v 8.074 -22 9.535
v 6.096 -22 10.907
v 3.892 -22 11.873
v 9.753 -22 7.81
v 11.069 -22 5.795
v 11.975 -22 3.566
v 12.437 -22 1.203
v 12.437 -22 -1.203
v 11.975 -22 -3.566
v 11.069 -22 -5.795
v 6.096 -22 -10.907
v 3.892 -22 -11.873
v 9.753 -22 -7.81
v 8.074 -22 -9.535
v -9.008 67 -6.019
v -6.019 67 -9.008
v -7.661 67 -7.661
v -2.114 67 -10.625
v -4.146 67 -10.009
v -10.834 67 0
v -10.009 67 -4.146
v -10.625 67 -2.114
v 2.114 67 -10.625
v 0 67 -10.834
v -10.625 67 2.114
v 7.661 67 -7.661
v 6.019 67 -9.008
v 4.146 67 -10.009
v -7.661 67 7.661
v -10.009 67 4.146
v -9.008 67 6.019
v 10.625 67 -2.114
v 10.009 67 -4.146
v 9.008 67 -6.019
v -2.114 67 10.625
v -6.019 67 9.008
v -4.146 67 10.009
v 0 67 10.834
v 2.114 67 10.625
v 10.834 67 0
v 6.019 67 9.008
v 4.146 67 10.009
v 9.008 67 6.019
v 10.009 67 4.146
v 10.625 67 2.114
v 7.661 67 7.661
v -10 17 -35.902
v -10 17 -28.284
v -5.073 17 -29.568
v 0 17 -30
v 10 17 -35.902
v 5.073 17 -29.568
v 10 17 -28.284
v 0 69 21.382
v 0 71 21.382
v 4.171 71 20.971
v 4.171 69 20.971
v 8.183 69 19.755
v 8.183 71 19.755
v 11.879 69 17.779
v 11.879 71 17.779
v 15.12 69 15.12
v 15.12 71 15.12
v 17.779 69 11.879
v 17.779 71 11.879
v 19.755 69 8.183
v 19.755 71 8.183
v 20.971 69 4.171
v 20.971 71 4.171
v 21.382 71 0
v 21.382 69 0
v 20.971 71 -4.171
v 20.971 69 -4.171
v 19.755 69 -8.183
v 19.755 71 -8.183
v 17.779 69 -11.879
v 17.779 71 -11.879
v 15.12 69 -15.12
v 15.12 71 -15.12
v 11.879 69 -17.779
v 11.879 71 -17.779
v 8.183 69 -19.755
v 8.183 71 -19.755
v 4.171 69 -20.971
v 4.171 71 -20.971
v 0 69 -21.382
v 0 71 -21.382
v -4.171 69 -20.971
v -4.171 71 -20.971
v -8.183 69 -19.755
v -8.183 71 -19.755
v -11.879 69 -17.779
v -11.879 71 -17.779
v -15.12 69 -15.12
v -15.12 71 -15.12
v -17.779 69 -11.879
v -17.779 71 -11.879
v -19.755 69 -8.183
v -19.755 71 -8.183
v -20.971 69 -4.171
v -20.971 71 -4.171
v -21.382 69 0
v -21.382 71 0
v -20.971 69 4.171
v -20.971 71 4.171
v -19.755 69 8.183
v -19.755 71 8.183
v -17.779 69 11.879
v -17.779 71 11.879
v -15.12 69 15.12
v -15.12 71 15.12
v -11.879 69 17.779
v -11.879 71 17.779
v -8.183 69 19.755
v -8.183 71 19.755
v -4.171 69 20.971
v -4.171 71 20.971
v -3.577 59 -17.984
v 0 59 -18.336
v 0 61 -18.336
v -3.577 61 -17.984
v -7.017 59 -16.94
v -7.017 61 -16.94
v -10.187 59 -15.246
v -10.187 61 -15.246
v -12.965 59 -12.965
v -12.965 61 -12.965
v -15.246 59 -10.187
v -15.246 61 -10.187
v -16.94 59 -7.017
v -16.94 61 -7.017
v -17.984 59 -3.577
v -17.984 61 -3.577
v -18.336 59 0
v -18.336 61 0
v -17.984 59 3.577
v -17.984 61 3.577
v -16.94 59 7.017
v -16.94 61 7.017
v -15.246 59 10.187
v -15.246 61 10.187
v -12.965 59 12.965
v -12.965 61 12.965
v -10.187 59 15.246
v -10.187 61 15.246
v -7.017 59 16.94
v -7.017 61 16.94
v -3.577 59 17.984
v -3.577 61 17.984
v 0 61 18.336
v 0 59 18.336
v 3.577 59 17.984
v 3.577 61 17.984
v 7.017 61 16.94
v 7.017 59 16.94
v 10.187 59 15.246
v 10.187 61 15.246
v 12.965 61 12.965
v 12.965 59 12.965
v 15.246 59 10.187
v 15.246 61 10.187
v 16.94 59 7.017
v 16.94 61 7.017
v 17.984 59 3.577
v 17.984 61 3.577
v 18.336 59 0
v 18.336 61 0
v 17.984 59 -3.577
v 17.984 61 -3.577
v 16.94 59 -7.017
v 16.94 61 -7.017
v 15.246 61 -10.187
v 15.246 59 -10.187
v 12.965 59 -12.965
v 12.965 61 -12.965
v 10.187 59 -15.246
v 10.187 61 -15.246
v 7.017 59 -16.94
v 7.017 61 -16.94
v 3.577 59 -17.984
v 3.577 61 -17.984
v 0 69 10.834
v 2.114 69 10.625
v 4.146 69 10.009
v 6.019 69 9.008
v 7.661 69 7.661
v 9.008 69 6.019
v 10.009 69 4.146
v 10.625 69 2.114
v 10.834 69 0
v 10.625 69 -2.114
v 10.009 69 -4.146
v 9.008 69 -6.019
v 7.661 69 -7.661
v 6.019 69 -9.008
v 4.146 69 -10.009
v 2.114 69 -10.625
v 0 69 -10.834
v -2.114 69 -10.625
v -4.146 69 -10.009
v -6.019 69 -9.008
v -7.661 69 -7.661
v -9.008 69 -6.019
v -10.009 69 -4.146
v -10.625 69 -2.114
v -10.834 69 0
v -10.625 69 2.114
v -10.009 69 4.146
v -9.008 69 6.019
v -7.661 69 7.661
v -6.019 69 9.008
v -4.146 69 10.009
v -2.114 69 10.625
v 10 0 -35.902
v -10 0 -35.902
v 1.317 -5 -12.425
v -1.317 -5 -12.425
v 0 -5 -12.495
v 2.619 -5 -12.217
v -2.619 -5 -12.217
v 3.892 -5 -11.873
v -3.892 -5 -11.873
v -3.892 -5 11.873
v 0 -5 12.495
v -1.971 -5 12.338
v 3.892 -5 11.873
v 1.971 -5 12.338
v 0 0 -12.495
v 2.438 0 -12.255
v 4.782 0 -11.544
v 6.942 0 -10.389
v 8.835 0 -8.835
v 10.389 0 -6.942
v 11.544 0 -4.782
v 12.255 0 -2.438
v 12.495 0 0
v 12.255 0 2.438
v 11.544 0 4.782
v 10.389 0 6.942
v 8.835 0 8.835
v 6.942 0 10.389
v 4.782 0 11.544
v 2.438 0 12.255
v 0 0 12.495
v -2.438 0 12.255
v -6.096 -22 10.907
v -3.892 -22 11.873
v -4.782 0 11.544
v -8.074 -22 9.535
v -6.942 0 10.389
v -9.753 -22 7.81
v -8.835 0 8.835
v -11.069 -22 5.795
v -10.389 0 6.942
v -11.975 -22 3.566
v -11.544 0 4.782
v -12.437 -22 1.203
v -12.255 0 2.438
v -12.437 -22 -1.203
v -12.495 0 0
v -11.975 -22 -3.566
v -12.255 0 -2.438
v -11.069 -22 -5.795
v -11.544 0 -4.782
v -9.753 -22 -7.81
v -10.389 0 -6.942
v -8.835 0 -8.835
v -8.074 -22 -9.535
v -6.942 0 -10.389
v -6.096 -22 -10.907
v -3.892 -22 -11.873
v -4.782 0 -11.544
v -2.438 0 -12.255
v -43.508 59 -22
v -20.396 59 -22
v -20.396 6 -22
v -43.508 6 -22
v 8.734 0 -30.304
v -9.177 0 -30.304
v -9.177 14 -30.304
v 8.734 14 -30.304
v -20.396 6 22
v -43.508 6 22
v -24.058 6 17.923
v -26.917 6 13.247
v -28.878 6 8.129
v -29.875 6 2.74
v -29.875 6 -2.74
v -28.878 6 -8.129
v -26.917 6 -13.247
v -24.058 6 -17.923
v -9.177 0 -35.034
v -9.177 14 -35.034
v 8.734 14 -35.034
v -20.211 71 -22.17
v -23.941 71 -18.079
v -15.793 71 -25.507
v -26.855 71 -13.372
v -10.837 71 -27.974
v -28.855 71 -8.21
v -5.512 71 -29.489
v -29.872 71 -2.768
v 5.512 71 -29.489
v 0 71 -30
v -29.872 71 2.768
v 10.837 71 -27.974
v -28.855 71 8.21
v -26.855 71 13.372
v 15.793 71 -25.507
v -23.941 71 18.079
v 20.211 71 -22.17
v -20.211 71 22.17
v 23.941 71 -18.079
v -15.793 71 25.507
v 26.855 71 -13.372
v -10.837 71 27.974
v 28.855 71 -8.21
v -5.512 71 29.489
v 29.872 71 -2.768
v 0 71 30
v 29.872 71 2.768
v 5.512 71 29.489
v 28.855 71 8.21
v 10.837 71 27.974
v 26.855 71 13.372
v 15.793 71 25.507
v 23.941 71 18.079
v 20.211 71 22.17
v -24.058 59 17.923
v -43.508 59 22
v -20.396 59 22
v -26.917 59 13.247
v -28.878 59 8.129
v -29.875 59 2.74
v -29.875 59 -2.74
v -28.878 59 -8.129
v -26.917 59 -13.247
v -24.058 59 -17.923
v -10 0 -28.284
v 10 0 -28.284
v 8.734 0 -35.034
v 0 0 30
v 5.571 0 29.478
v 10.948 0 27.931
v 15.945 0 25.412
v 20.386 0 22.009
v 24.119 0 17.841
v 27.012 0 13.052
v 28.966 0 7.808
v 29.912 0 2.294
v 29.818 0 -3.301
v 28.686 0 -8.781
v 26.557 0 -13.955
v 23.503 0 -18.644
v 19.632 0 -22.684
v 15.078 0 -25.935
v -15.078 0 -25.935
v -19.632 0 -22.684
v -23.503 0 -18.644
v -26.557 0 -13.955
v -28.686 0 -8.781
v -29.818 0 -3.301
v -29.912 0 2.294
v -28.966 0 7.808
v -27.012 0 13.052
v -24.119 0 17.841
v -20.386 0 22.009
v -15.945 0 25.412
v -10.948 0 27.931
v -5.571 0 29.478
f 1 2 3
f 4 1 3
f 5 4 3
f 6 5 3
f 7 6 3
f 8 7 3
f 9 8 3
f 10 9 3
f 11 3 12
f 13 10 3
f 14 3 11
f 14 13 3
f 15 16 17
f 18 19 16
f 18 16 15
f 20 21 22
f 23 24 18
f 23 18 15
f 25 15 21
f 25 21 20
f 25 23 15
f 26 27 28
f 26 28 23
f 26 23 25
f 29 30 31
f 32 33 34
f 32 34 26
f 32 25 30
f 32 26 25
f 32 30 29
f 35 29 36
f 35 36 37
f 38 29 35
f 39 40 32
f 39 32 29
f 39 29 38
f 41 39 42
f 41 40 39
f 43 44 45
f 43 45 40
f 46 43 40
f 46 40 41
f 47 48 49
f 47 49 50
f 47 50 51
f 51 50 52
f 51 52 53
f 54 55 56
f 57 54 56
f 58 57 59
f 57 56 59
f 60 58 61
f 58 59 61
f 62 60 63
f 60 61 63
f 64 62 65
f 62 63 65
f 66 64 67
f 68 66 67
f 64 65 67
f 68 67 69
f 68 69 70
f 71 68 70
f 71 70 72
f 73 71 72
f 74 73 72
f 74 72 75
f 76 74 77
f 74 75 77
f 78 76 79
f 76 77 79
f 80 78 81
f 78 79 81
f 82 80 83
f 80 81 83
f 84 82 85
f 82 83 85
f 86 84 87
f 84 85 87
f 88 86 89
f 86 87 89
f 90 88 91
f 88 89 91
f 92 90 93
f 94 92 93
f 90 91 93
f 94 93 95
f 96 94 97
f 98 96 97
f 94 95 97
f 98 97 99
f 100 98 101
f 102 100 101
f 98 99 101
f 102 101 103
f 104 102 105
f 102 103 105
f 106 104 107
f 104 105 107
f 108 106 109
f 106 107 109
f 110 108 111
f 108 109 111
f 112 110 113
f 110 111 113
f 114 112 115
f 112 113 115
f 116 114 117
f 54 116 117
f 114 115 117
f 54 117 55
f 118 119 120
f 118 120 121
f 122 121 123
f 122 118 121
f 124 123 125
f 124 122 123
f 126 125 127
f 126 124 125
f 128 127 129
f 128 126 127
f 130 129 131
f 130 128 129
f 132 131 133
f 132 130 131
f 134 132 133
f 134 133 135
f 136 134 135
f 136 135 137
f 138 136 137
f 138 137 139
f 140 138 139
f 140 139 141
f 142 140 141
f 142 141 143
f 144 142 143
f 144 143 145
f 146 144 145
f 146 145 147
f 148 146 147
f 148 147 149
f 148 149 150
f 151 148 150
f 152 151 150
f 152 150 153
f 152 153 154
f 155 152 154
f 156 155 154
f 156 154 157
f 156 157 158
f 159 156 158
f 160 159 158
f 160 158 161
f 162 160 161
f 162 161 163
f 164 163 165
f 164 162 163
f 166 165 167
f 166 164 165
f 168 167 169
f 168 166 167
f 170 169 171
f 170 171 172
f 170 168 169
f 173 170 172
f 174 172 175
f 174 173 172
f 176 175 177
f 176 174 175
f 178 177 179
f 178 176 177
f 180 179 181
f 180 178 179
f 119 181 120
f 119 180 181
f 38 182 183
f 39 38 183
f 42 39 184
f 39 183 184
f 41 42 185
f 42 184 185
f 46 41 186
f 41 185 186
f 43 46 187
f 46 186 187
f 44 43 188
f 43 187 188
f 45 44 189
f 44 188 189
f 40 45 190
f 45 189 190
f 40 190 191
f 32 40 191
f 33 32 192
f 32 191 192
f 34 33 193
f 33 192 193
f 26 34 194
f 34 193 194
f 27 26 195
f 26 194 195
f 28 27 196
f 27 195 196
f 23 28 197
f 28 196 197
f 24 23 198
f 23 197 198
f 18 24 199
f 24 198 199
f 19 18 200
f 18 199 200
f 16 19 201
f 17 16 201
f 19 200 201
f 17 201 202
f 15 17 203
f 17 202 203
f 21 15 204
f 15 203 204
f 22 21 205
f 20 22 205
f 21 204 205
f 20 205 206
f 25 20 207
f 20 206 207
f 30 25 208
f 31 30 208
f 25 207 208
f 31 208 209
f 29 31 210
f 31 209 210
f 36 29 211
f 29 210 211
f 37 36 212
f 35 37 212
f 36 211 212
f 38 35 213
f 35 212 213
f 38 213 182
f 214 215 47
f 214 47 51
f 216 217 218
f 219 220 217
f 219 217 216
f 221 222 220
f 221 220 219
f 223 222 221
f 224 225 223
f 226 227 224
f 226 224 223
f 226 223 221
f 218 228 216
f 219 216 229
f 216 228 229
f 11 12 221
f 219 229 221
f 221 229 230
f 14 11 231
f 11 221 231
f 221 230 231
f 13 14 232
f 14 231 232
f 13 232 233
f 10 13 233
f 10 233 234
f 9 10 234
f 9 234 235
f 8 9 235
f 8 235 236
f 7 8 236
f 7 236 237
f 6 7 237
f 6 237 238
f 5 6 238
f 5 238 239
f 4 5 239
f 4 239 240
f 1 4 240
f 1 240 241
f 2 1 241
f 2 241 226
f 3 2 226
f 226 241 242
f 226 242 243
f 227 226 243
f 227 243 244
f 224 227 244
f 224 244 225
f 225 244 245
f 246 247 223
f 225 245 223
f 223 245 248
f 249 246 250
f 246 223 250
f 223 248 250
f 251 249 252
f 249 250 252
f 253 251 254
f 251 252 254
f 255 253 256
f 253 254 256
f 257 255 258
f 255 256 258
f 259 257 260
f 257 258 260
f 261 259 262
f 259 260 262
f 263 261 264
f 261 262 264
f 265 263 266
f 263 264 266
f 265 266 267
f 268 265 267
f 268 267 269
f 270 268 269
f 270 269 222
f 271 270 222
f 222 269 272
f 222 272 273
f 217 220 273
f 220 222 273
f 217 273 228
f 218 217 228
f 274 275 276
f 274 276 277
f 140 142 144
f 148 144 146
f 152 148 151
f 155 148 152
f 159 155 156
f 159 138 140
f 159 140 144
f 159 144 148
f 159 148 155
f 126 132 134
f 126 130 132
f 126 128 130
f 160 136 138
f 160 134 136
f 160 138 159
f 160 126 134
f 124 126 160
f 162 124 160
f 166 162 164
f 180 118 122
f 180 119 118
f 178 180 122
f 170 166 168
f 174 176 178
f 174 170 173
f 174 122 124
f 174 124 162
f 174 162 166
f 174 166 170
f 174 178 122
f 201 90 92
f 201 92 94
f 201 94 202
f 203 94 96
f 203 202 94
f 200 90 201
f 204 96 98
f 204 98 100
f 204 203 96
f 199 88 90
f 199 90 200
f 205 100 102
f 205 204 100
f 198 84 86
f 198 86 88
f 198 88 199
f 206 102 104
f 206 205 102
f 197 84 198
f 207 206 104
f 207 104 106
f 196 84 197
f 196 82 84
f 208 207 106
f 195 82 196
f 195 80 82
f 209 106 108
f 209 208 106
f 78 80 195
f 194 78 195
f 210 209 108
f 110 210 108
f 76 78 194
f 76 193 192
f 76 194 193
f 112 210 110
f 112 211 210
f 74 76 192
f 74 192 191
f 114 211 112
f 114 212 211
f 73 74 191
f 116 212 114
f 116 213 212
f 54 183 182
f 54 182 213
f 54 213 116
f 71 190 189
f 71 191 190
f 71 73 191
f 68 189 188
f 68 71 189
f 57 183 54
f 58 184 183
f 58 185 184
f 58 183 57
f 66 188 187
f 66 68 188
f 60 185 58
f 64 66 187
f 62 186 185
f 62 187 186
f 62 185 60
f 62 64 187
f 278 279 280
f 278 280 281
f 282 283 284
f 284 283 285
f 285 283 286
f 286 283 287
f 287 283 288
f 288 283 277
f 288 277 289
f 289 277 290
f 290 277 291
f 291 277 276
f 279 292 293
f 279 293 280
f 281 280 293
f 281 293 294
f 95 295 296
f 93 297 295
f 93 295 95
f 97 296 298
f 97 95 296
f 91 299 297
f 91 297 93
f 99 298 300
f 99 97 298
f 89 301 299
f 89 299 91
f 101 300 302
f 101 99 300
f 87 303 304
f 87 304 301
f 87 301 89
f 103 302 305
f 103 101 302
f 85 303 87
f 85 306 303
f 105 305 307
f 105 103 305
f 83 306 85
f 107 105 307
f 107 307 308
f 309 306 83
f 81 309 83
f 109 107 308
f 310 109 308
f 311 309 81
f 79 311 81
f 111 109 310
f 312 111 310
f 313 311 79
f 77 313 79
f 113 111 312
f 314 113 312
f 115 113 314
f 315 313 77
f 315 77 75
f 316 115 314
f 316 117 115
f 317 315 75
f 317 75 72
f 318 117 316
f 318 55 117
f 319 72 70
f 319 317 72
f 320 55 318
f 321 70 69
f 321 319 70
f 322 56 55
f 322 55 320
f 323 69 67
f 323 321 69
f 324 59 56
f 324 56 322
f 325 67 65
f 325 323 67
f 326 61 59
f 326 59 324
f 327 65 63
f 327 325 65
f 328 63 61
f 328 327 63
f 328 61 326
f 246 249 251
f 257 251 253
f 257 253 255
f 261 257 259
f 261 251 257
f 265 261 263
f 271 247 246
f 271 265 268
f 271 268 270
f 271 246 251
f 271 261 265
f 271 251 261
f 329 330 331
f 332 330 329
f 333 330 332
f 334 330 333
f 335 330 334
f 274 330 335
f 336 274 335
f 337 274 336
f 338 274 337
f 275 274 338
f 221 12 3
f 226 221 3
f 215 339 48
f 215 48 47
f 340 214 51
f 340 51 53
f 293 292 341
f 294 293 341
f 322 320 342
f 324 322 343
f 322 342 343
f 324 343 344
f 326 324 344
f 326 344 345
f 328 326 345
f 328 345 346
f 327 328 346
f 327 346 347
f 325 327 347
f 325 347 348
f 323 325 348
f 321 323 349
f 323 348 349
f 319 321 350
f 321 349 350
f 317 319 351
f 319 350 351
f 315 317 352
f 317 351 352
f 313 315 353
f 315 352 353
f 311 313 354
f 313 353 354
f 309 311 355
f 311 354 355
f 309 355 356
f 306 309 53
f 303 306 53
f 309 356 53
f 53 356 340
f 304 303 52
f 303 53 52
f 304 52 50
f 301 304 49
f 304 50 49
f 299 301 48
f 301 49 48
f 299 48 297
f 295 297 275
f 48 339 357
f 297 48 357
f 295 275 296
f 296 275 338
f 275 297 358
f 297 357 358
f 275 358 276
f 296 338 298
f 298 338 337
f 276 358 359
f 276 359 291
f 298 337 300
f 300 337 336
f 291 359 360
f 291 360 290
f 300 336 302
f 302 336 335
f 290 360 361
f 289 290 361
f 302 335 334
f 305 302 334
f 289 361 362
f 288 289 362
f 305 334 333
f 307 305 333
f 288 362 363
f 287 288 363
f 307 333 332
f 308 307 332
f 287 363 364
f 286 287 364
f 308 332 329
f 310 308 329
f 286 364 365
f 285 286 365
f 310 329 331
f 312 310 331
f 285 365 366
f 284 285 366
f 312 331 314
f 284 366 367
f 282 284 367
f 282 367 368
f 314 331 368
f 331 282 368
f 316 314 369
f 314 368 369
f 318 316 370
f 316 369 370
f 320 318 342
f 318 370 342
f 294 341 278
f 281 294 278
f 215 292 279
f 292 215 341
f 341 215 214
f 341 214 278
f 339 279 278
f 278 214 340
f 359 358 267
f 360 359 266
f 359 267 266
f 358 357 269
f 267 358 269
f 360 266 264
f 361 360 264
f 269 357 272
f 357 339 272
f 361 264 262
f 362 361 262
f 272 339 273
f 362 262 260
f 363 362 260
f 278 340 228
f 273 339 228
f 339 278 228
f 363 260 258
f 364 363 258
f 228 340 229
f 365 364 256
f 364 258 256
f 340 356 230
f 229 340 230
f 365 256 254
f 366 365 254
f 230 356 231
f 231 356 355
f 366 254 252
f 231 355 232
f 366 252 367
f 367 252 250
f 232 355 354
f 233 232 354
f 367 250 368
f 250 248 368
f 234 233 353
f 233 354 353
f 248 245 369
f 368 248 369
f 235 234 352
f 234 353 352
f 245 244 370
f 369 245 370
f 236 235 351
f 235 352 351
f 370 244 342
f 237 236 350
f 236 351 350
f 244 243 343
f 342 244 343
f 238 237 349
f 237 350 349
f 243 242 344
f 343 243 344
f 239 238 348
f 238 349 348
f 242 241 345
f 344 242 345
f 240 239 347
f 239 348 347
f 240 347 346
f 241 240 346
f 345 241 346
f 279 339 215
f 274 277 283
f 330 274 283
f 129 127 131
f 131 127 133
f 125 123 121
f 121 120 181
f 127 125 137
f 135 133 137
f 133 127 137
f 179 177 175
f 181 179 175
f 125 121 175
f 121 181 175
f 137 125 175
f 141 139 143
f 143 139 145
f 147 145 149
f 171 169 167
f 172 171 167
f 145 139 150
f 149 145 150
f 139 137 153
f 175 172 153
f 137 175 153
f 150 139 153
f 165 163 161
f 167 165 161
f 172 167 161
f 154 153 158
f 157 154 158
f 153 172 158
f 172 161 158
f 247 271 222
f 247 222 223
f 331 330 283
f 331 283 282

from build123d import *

# Parameters (mm, degrees)
ESBO_O1_R                     = 30
RESSALTO_EXTRUS_O2_DEPTH      = 10
ESBO_O3_R                     = 12.494753049
RESSALTO_EXTRUS_O3_DEPTH      = 22
ESBO_O4_R                     = 30
ESBO_O4_R_2                   = 18.335840205
RESSALTO_EXTRUS_O4_DEPTH      = 51
ESBO_O5_R                     = 30
RESSALTO_EXTRUS_O5_DEPTH      = 10
ESBO_O6_R                     = 21.382326649
CORTE_EXTRUS_O1_DEPTH         = 2
ESBO_O7_R                     = 10.833594829
CORTE_EXTRUS_O2_DEPTH         = 2
ESBO_O8_W                     = 7.784469092
ESBO_O8_H                     = 33.042586886
CORTE_EXTRUS_O3_DEPTH         = 17
RESSALTO_EXTRUS_O7_DEPTH      = 17
ESBO_O11_W                    = 17.91144748
ESBO_O11_H                    = 4.730260337
CORTE_EXTRUS_O4_DEPTH         = 14
RESSALTO_EXTRUS_O9_DEPTH      = 29
RESSALTO_EXTRUS_O9_DEPTH_BACK = 24


with BuildPart() as part:
    # Esboço1 → Ressalto-extrusão2 (new body)
    with BuildSketch(Plane(origin=(0, 0, 0), x_dir=(1, 0, 0), z_dir=(0, 1, 0))):
        with Locations(Location((0, 0, 0), (0, 0, 270))):
            Circle(ESBO_O1_R)
    extrude(amount=RESSALTO_EXTRUS_O2_DEPTH)

    # Esboço3 → Ressalto-extrusão3 (add)
    with BuildSketch(Plane.XZ):
        with Locations(Location((0, 0, 0), (0, 0, 270))):
            Circle(ESBO_O3_R)
    extrude(amount=RESSALTO_EXTRUS_O3_DEPTH)

    # Esboço4 → Ressalto-extrusão4 (add)
    with BuildSketch(Plane(origin=(0, 10, 0), x_dir=(1, 0, 0), z_dir=(0, 1, 0))):
        with Locations(Location((0, 0, 0), (0, 0, 270))):
            Circle(ESBO_O4_R)
        with Locations(Location((0, 0, 0), (0, 0, 90))):
            Circle(ESBO_O4_R_2, mode=Mode.SUBTRACT)
    extrude(amount=RESSALTO_EXTRUS_O4_DEPTH)

    # Esboço5 → Ressalto-extrusão5 (add)
    with BuildSketch(Plane(origin=(0, 61, 0), x_dir=(1, 0, 0), z_dir=(0, 1, 0))):
        with Locations(Location((0, 0, 0), (0, 0, 270))):
            Circle(ESBO_O5_R)
    extrude(amount=RESSALTO_EXTRUS_O5_DEPTH)

    # Esboço6 → Corte-extrusão1 (cut)
    with BuildSketch(Plane(origin=(0, 71, 0), x_dir=(1, 0, 0), z_dir=(0, 1, 0))):
        with Locations(Location((0, 0, 0), (0, 0, 270))):
            Circle(ESBO_O6_R)
    extrude(amount=-CORTE_EXTRUS_O1_DEPTH, mode=Mode.SUBTRACT)

    # Esboço7 → Corte-extrusão2 (cut)
    with BuildSketch(Plane(origin=(0, 69, 0), x_dir=(1, 0, 0), z_dir=(0, 1, 0))):
        with Locations(Location((0, 0, 0), (0, 0, 270))):
            Circle(ESBO_O7_R)
    extrude(amount=-CORTE_EXTRUS_O2_DEPTH, mode=Mode.SUBTRACT)

    # Esboço8 → Corte-extrusão3 (cut)
    with BuildSketch(Plane.XZ.offset(22)):
        Rectangle(ESBO_O8_W, ESBO_O8_H)
    extrude(amount=-CORTE_EXTRUS_O3_DEPTH, mode=Mode.SUBTRACT)

    # Esboço10 → Ressalto-extrusão7 (add)
    with BuildSketch(Plane.XZ):
        with BuildLine():
            Line((-10, -30), (-10, -35.901739495))
            Line((-10, -35.901739495), (10, -35.901739495))
            Line((10, -35.901739495), (10, -30))
            Line((10, -30), (10, -28.284271247))
            ThreePointArc((10, -28.284271247), (0, -30), (-10, -28.284271247))
            Line((-10, -28.284271247), (-10, -30))
        make_face()
    extrude(amount=-RESSALTO_EXTRUS_O7_DEPTH)

    # Esboço11 → Corte-extrusão4 (cut)
    with BuildSketch(Plane.XZ):
        with Locations((-0.221595313, -32.668697771)):
            Rectangle(ESBO_O11_W, ESBO_O11_H)
    extrude(amount=-CORTE_EXTRUS_O4_DEPTH, mode=Mode.SUBTRACT)

    # Esboço13 → Ressalto-extrusão9 (add, two sides: drawn at the far end of the back side and taken through both)
    with BuildSketch(Plane(origin=(0, 30, 0), x_dir=(1, 0, 0), z_dir=(0, 1, 0)).offset(-RESSALTO_EXTRUS_O9_DEPTH_BACK)):
        with BuildLine():
            Line((-30, 22), (-43.507715599, 22))
            Line((-43.507715599, 22), (-43.507715599, -22))
            Line((-43.507715599, -22), (-30, -22))
            Line((-30, -22), (-20.396078054, -22))
            ThreePointArc((-20.396078054, -22), (30, 0), (-20.396078054, 22))
            Line((-20.396078054, 22), (-30, 22))
        make_face()
    extrude(amount=RESSALTO_EXTRUS_O9_DEPTH + RESSALTO_EXTRUS_O9_DEPTH_BACK)


solid = part.part
